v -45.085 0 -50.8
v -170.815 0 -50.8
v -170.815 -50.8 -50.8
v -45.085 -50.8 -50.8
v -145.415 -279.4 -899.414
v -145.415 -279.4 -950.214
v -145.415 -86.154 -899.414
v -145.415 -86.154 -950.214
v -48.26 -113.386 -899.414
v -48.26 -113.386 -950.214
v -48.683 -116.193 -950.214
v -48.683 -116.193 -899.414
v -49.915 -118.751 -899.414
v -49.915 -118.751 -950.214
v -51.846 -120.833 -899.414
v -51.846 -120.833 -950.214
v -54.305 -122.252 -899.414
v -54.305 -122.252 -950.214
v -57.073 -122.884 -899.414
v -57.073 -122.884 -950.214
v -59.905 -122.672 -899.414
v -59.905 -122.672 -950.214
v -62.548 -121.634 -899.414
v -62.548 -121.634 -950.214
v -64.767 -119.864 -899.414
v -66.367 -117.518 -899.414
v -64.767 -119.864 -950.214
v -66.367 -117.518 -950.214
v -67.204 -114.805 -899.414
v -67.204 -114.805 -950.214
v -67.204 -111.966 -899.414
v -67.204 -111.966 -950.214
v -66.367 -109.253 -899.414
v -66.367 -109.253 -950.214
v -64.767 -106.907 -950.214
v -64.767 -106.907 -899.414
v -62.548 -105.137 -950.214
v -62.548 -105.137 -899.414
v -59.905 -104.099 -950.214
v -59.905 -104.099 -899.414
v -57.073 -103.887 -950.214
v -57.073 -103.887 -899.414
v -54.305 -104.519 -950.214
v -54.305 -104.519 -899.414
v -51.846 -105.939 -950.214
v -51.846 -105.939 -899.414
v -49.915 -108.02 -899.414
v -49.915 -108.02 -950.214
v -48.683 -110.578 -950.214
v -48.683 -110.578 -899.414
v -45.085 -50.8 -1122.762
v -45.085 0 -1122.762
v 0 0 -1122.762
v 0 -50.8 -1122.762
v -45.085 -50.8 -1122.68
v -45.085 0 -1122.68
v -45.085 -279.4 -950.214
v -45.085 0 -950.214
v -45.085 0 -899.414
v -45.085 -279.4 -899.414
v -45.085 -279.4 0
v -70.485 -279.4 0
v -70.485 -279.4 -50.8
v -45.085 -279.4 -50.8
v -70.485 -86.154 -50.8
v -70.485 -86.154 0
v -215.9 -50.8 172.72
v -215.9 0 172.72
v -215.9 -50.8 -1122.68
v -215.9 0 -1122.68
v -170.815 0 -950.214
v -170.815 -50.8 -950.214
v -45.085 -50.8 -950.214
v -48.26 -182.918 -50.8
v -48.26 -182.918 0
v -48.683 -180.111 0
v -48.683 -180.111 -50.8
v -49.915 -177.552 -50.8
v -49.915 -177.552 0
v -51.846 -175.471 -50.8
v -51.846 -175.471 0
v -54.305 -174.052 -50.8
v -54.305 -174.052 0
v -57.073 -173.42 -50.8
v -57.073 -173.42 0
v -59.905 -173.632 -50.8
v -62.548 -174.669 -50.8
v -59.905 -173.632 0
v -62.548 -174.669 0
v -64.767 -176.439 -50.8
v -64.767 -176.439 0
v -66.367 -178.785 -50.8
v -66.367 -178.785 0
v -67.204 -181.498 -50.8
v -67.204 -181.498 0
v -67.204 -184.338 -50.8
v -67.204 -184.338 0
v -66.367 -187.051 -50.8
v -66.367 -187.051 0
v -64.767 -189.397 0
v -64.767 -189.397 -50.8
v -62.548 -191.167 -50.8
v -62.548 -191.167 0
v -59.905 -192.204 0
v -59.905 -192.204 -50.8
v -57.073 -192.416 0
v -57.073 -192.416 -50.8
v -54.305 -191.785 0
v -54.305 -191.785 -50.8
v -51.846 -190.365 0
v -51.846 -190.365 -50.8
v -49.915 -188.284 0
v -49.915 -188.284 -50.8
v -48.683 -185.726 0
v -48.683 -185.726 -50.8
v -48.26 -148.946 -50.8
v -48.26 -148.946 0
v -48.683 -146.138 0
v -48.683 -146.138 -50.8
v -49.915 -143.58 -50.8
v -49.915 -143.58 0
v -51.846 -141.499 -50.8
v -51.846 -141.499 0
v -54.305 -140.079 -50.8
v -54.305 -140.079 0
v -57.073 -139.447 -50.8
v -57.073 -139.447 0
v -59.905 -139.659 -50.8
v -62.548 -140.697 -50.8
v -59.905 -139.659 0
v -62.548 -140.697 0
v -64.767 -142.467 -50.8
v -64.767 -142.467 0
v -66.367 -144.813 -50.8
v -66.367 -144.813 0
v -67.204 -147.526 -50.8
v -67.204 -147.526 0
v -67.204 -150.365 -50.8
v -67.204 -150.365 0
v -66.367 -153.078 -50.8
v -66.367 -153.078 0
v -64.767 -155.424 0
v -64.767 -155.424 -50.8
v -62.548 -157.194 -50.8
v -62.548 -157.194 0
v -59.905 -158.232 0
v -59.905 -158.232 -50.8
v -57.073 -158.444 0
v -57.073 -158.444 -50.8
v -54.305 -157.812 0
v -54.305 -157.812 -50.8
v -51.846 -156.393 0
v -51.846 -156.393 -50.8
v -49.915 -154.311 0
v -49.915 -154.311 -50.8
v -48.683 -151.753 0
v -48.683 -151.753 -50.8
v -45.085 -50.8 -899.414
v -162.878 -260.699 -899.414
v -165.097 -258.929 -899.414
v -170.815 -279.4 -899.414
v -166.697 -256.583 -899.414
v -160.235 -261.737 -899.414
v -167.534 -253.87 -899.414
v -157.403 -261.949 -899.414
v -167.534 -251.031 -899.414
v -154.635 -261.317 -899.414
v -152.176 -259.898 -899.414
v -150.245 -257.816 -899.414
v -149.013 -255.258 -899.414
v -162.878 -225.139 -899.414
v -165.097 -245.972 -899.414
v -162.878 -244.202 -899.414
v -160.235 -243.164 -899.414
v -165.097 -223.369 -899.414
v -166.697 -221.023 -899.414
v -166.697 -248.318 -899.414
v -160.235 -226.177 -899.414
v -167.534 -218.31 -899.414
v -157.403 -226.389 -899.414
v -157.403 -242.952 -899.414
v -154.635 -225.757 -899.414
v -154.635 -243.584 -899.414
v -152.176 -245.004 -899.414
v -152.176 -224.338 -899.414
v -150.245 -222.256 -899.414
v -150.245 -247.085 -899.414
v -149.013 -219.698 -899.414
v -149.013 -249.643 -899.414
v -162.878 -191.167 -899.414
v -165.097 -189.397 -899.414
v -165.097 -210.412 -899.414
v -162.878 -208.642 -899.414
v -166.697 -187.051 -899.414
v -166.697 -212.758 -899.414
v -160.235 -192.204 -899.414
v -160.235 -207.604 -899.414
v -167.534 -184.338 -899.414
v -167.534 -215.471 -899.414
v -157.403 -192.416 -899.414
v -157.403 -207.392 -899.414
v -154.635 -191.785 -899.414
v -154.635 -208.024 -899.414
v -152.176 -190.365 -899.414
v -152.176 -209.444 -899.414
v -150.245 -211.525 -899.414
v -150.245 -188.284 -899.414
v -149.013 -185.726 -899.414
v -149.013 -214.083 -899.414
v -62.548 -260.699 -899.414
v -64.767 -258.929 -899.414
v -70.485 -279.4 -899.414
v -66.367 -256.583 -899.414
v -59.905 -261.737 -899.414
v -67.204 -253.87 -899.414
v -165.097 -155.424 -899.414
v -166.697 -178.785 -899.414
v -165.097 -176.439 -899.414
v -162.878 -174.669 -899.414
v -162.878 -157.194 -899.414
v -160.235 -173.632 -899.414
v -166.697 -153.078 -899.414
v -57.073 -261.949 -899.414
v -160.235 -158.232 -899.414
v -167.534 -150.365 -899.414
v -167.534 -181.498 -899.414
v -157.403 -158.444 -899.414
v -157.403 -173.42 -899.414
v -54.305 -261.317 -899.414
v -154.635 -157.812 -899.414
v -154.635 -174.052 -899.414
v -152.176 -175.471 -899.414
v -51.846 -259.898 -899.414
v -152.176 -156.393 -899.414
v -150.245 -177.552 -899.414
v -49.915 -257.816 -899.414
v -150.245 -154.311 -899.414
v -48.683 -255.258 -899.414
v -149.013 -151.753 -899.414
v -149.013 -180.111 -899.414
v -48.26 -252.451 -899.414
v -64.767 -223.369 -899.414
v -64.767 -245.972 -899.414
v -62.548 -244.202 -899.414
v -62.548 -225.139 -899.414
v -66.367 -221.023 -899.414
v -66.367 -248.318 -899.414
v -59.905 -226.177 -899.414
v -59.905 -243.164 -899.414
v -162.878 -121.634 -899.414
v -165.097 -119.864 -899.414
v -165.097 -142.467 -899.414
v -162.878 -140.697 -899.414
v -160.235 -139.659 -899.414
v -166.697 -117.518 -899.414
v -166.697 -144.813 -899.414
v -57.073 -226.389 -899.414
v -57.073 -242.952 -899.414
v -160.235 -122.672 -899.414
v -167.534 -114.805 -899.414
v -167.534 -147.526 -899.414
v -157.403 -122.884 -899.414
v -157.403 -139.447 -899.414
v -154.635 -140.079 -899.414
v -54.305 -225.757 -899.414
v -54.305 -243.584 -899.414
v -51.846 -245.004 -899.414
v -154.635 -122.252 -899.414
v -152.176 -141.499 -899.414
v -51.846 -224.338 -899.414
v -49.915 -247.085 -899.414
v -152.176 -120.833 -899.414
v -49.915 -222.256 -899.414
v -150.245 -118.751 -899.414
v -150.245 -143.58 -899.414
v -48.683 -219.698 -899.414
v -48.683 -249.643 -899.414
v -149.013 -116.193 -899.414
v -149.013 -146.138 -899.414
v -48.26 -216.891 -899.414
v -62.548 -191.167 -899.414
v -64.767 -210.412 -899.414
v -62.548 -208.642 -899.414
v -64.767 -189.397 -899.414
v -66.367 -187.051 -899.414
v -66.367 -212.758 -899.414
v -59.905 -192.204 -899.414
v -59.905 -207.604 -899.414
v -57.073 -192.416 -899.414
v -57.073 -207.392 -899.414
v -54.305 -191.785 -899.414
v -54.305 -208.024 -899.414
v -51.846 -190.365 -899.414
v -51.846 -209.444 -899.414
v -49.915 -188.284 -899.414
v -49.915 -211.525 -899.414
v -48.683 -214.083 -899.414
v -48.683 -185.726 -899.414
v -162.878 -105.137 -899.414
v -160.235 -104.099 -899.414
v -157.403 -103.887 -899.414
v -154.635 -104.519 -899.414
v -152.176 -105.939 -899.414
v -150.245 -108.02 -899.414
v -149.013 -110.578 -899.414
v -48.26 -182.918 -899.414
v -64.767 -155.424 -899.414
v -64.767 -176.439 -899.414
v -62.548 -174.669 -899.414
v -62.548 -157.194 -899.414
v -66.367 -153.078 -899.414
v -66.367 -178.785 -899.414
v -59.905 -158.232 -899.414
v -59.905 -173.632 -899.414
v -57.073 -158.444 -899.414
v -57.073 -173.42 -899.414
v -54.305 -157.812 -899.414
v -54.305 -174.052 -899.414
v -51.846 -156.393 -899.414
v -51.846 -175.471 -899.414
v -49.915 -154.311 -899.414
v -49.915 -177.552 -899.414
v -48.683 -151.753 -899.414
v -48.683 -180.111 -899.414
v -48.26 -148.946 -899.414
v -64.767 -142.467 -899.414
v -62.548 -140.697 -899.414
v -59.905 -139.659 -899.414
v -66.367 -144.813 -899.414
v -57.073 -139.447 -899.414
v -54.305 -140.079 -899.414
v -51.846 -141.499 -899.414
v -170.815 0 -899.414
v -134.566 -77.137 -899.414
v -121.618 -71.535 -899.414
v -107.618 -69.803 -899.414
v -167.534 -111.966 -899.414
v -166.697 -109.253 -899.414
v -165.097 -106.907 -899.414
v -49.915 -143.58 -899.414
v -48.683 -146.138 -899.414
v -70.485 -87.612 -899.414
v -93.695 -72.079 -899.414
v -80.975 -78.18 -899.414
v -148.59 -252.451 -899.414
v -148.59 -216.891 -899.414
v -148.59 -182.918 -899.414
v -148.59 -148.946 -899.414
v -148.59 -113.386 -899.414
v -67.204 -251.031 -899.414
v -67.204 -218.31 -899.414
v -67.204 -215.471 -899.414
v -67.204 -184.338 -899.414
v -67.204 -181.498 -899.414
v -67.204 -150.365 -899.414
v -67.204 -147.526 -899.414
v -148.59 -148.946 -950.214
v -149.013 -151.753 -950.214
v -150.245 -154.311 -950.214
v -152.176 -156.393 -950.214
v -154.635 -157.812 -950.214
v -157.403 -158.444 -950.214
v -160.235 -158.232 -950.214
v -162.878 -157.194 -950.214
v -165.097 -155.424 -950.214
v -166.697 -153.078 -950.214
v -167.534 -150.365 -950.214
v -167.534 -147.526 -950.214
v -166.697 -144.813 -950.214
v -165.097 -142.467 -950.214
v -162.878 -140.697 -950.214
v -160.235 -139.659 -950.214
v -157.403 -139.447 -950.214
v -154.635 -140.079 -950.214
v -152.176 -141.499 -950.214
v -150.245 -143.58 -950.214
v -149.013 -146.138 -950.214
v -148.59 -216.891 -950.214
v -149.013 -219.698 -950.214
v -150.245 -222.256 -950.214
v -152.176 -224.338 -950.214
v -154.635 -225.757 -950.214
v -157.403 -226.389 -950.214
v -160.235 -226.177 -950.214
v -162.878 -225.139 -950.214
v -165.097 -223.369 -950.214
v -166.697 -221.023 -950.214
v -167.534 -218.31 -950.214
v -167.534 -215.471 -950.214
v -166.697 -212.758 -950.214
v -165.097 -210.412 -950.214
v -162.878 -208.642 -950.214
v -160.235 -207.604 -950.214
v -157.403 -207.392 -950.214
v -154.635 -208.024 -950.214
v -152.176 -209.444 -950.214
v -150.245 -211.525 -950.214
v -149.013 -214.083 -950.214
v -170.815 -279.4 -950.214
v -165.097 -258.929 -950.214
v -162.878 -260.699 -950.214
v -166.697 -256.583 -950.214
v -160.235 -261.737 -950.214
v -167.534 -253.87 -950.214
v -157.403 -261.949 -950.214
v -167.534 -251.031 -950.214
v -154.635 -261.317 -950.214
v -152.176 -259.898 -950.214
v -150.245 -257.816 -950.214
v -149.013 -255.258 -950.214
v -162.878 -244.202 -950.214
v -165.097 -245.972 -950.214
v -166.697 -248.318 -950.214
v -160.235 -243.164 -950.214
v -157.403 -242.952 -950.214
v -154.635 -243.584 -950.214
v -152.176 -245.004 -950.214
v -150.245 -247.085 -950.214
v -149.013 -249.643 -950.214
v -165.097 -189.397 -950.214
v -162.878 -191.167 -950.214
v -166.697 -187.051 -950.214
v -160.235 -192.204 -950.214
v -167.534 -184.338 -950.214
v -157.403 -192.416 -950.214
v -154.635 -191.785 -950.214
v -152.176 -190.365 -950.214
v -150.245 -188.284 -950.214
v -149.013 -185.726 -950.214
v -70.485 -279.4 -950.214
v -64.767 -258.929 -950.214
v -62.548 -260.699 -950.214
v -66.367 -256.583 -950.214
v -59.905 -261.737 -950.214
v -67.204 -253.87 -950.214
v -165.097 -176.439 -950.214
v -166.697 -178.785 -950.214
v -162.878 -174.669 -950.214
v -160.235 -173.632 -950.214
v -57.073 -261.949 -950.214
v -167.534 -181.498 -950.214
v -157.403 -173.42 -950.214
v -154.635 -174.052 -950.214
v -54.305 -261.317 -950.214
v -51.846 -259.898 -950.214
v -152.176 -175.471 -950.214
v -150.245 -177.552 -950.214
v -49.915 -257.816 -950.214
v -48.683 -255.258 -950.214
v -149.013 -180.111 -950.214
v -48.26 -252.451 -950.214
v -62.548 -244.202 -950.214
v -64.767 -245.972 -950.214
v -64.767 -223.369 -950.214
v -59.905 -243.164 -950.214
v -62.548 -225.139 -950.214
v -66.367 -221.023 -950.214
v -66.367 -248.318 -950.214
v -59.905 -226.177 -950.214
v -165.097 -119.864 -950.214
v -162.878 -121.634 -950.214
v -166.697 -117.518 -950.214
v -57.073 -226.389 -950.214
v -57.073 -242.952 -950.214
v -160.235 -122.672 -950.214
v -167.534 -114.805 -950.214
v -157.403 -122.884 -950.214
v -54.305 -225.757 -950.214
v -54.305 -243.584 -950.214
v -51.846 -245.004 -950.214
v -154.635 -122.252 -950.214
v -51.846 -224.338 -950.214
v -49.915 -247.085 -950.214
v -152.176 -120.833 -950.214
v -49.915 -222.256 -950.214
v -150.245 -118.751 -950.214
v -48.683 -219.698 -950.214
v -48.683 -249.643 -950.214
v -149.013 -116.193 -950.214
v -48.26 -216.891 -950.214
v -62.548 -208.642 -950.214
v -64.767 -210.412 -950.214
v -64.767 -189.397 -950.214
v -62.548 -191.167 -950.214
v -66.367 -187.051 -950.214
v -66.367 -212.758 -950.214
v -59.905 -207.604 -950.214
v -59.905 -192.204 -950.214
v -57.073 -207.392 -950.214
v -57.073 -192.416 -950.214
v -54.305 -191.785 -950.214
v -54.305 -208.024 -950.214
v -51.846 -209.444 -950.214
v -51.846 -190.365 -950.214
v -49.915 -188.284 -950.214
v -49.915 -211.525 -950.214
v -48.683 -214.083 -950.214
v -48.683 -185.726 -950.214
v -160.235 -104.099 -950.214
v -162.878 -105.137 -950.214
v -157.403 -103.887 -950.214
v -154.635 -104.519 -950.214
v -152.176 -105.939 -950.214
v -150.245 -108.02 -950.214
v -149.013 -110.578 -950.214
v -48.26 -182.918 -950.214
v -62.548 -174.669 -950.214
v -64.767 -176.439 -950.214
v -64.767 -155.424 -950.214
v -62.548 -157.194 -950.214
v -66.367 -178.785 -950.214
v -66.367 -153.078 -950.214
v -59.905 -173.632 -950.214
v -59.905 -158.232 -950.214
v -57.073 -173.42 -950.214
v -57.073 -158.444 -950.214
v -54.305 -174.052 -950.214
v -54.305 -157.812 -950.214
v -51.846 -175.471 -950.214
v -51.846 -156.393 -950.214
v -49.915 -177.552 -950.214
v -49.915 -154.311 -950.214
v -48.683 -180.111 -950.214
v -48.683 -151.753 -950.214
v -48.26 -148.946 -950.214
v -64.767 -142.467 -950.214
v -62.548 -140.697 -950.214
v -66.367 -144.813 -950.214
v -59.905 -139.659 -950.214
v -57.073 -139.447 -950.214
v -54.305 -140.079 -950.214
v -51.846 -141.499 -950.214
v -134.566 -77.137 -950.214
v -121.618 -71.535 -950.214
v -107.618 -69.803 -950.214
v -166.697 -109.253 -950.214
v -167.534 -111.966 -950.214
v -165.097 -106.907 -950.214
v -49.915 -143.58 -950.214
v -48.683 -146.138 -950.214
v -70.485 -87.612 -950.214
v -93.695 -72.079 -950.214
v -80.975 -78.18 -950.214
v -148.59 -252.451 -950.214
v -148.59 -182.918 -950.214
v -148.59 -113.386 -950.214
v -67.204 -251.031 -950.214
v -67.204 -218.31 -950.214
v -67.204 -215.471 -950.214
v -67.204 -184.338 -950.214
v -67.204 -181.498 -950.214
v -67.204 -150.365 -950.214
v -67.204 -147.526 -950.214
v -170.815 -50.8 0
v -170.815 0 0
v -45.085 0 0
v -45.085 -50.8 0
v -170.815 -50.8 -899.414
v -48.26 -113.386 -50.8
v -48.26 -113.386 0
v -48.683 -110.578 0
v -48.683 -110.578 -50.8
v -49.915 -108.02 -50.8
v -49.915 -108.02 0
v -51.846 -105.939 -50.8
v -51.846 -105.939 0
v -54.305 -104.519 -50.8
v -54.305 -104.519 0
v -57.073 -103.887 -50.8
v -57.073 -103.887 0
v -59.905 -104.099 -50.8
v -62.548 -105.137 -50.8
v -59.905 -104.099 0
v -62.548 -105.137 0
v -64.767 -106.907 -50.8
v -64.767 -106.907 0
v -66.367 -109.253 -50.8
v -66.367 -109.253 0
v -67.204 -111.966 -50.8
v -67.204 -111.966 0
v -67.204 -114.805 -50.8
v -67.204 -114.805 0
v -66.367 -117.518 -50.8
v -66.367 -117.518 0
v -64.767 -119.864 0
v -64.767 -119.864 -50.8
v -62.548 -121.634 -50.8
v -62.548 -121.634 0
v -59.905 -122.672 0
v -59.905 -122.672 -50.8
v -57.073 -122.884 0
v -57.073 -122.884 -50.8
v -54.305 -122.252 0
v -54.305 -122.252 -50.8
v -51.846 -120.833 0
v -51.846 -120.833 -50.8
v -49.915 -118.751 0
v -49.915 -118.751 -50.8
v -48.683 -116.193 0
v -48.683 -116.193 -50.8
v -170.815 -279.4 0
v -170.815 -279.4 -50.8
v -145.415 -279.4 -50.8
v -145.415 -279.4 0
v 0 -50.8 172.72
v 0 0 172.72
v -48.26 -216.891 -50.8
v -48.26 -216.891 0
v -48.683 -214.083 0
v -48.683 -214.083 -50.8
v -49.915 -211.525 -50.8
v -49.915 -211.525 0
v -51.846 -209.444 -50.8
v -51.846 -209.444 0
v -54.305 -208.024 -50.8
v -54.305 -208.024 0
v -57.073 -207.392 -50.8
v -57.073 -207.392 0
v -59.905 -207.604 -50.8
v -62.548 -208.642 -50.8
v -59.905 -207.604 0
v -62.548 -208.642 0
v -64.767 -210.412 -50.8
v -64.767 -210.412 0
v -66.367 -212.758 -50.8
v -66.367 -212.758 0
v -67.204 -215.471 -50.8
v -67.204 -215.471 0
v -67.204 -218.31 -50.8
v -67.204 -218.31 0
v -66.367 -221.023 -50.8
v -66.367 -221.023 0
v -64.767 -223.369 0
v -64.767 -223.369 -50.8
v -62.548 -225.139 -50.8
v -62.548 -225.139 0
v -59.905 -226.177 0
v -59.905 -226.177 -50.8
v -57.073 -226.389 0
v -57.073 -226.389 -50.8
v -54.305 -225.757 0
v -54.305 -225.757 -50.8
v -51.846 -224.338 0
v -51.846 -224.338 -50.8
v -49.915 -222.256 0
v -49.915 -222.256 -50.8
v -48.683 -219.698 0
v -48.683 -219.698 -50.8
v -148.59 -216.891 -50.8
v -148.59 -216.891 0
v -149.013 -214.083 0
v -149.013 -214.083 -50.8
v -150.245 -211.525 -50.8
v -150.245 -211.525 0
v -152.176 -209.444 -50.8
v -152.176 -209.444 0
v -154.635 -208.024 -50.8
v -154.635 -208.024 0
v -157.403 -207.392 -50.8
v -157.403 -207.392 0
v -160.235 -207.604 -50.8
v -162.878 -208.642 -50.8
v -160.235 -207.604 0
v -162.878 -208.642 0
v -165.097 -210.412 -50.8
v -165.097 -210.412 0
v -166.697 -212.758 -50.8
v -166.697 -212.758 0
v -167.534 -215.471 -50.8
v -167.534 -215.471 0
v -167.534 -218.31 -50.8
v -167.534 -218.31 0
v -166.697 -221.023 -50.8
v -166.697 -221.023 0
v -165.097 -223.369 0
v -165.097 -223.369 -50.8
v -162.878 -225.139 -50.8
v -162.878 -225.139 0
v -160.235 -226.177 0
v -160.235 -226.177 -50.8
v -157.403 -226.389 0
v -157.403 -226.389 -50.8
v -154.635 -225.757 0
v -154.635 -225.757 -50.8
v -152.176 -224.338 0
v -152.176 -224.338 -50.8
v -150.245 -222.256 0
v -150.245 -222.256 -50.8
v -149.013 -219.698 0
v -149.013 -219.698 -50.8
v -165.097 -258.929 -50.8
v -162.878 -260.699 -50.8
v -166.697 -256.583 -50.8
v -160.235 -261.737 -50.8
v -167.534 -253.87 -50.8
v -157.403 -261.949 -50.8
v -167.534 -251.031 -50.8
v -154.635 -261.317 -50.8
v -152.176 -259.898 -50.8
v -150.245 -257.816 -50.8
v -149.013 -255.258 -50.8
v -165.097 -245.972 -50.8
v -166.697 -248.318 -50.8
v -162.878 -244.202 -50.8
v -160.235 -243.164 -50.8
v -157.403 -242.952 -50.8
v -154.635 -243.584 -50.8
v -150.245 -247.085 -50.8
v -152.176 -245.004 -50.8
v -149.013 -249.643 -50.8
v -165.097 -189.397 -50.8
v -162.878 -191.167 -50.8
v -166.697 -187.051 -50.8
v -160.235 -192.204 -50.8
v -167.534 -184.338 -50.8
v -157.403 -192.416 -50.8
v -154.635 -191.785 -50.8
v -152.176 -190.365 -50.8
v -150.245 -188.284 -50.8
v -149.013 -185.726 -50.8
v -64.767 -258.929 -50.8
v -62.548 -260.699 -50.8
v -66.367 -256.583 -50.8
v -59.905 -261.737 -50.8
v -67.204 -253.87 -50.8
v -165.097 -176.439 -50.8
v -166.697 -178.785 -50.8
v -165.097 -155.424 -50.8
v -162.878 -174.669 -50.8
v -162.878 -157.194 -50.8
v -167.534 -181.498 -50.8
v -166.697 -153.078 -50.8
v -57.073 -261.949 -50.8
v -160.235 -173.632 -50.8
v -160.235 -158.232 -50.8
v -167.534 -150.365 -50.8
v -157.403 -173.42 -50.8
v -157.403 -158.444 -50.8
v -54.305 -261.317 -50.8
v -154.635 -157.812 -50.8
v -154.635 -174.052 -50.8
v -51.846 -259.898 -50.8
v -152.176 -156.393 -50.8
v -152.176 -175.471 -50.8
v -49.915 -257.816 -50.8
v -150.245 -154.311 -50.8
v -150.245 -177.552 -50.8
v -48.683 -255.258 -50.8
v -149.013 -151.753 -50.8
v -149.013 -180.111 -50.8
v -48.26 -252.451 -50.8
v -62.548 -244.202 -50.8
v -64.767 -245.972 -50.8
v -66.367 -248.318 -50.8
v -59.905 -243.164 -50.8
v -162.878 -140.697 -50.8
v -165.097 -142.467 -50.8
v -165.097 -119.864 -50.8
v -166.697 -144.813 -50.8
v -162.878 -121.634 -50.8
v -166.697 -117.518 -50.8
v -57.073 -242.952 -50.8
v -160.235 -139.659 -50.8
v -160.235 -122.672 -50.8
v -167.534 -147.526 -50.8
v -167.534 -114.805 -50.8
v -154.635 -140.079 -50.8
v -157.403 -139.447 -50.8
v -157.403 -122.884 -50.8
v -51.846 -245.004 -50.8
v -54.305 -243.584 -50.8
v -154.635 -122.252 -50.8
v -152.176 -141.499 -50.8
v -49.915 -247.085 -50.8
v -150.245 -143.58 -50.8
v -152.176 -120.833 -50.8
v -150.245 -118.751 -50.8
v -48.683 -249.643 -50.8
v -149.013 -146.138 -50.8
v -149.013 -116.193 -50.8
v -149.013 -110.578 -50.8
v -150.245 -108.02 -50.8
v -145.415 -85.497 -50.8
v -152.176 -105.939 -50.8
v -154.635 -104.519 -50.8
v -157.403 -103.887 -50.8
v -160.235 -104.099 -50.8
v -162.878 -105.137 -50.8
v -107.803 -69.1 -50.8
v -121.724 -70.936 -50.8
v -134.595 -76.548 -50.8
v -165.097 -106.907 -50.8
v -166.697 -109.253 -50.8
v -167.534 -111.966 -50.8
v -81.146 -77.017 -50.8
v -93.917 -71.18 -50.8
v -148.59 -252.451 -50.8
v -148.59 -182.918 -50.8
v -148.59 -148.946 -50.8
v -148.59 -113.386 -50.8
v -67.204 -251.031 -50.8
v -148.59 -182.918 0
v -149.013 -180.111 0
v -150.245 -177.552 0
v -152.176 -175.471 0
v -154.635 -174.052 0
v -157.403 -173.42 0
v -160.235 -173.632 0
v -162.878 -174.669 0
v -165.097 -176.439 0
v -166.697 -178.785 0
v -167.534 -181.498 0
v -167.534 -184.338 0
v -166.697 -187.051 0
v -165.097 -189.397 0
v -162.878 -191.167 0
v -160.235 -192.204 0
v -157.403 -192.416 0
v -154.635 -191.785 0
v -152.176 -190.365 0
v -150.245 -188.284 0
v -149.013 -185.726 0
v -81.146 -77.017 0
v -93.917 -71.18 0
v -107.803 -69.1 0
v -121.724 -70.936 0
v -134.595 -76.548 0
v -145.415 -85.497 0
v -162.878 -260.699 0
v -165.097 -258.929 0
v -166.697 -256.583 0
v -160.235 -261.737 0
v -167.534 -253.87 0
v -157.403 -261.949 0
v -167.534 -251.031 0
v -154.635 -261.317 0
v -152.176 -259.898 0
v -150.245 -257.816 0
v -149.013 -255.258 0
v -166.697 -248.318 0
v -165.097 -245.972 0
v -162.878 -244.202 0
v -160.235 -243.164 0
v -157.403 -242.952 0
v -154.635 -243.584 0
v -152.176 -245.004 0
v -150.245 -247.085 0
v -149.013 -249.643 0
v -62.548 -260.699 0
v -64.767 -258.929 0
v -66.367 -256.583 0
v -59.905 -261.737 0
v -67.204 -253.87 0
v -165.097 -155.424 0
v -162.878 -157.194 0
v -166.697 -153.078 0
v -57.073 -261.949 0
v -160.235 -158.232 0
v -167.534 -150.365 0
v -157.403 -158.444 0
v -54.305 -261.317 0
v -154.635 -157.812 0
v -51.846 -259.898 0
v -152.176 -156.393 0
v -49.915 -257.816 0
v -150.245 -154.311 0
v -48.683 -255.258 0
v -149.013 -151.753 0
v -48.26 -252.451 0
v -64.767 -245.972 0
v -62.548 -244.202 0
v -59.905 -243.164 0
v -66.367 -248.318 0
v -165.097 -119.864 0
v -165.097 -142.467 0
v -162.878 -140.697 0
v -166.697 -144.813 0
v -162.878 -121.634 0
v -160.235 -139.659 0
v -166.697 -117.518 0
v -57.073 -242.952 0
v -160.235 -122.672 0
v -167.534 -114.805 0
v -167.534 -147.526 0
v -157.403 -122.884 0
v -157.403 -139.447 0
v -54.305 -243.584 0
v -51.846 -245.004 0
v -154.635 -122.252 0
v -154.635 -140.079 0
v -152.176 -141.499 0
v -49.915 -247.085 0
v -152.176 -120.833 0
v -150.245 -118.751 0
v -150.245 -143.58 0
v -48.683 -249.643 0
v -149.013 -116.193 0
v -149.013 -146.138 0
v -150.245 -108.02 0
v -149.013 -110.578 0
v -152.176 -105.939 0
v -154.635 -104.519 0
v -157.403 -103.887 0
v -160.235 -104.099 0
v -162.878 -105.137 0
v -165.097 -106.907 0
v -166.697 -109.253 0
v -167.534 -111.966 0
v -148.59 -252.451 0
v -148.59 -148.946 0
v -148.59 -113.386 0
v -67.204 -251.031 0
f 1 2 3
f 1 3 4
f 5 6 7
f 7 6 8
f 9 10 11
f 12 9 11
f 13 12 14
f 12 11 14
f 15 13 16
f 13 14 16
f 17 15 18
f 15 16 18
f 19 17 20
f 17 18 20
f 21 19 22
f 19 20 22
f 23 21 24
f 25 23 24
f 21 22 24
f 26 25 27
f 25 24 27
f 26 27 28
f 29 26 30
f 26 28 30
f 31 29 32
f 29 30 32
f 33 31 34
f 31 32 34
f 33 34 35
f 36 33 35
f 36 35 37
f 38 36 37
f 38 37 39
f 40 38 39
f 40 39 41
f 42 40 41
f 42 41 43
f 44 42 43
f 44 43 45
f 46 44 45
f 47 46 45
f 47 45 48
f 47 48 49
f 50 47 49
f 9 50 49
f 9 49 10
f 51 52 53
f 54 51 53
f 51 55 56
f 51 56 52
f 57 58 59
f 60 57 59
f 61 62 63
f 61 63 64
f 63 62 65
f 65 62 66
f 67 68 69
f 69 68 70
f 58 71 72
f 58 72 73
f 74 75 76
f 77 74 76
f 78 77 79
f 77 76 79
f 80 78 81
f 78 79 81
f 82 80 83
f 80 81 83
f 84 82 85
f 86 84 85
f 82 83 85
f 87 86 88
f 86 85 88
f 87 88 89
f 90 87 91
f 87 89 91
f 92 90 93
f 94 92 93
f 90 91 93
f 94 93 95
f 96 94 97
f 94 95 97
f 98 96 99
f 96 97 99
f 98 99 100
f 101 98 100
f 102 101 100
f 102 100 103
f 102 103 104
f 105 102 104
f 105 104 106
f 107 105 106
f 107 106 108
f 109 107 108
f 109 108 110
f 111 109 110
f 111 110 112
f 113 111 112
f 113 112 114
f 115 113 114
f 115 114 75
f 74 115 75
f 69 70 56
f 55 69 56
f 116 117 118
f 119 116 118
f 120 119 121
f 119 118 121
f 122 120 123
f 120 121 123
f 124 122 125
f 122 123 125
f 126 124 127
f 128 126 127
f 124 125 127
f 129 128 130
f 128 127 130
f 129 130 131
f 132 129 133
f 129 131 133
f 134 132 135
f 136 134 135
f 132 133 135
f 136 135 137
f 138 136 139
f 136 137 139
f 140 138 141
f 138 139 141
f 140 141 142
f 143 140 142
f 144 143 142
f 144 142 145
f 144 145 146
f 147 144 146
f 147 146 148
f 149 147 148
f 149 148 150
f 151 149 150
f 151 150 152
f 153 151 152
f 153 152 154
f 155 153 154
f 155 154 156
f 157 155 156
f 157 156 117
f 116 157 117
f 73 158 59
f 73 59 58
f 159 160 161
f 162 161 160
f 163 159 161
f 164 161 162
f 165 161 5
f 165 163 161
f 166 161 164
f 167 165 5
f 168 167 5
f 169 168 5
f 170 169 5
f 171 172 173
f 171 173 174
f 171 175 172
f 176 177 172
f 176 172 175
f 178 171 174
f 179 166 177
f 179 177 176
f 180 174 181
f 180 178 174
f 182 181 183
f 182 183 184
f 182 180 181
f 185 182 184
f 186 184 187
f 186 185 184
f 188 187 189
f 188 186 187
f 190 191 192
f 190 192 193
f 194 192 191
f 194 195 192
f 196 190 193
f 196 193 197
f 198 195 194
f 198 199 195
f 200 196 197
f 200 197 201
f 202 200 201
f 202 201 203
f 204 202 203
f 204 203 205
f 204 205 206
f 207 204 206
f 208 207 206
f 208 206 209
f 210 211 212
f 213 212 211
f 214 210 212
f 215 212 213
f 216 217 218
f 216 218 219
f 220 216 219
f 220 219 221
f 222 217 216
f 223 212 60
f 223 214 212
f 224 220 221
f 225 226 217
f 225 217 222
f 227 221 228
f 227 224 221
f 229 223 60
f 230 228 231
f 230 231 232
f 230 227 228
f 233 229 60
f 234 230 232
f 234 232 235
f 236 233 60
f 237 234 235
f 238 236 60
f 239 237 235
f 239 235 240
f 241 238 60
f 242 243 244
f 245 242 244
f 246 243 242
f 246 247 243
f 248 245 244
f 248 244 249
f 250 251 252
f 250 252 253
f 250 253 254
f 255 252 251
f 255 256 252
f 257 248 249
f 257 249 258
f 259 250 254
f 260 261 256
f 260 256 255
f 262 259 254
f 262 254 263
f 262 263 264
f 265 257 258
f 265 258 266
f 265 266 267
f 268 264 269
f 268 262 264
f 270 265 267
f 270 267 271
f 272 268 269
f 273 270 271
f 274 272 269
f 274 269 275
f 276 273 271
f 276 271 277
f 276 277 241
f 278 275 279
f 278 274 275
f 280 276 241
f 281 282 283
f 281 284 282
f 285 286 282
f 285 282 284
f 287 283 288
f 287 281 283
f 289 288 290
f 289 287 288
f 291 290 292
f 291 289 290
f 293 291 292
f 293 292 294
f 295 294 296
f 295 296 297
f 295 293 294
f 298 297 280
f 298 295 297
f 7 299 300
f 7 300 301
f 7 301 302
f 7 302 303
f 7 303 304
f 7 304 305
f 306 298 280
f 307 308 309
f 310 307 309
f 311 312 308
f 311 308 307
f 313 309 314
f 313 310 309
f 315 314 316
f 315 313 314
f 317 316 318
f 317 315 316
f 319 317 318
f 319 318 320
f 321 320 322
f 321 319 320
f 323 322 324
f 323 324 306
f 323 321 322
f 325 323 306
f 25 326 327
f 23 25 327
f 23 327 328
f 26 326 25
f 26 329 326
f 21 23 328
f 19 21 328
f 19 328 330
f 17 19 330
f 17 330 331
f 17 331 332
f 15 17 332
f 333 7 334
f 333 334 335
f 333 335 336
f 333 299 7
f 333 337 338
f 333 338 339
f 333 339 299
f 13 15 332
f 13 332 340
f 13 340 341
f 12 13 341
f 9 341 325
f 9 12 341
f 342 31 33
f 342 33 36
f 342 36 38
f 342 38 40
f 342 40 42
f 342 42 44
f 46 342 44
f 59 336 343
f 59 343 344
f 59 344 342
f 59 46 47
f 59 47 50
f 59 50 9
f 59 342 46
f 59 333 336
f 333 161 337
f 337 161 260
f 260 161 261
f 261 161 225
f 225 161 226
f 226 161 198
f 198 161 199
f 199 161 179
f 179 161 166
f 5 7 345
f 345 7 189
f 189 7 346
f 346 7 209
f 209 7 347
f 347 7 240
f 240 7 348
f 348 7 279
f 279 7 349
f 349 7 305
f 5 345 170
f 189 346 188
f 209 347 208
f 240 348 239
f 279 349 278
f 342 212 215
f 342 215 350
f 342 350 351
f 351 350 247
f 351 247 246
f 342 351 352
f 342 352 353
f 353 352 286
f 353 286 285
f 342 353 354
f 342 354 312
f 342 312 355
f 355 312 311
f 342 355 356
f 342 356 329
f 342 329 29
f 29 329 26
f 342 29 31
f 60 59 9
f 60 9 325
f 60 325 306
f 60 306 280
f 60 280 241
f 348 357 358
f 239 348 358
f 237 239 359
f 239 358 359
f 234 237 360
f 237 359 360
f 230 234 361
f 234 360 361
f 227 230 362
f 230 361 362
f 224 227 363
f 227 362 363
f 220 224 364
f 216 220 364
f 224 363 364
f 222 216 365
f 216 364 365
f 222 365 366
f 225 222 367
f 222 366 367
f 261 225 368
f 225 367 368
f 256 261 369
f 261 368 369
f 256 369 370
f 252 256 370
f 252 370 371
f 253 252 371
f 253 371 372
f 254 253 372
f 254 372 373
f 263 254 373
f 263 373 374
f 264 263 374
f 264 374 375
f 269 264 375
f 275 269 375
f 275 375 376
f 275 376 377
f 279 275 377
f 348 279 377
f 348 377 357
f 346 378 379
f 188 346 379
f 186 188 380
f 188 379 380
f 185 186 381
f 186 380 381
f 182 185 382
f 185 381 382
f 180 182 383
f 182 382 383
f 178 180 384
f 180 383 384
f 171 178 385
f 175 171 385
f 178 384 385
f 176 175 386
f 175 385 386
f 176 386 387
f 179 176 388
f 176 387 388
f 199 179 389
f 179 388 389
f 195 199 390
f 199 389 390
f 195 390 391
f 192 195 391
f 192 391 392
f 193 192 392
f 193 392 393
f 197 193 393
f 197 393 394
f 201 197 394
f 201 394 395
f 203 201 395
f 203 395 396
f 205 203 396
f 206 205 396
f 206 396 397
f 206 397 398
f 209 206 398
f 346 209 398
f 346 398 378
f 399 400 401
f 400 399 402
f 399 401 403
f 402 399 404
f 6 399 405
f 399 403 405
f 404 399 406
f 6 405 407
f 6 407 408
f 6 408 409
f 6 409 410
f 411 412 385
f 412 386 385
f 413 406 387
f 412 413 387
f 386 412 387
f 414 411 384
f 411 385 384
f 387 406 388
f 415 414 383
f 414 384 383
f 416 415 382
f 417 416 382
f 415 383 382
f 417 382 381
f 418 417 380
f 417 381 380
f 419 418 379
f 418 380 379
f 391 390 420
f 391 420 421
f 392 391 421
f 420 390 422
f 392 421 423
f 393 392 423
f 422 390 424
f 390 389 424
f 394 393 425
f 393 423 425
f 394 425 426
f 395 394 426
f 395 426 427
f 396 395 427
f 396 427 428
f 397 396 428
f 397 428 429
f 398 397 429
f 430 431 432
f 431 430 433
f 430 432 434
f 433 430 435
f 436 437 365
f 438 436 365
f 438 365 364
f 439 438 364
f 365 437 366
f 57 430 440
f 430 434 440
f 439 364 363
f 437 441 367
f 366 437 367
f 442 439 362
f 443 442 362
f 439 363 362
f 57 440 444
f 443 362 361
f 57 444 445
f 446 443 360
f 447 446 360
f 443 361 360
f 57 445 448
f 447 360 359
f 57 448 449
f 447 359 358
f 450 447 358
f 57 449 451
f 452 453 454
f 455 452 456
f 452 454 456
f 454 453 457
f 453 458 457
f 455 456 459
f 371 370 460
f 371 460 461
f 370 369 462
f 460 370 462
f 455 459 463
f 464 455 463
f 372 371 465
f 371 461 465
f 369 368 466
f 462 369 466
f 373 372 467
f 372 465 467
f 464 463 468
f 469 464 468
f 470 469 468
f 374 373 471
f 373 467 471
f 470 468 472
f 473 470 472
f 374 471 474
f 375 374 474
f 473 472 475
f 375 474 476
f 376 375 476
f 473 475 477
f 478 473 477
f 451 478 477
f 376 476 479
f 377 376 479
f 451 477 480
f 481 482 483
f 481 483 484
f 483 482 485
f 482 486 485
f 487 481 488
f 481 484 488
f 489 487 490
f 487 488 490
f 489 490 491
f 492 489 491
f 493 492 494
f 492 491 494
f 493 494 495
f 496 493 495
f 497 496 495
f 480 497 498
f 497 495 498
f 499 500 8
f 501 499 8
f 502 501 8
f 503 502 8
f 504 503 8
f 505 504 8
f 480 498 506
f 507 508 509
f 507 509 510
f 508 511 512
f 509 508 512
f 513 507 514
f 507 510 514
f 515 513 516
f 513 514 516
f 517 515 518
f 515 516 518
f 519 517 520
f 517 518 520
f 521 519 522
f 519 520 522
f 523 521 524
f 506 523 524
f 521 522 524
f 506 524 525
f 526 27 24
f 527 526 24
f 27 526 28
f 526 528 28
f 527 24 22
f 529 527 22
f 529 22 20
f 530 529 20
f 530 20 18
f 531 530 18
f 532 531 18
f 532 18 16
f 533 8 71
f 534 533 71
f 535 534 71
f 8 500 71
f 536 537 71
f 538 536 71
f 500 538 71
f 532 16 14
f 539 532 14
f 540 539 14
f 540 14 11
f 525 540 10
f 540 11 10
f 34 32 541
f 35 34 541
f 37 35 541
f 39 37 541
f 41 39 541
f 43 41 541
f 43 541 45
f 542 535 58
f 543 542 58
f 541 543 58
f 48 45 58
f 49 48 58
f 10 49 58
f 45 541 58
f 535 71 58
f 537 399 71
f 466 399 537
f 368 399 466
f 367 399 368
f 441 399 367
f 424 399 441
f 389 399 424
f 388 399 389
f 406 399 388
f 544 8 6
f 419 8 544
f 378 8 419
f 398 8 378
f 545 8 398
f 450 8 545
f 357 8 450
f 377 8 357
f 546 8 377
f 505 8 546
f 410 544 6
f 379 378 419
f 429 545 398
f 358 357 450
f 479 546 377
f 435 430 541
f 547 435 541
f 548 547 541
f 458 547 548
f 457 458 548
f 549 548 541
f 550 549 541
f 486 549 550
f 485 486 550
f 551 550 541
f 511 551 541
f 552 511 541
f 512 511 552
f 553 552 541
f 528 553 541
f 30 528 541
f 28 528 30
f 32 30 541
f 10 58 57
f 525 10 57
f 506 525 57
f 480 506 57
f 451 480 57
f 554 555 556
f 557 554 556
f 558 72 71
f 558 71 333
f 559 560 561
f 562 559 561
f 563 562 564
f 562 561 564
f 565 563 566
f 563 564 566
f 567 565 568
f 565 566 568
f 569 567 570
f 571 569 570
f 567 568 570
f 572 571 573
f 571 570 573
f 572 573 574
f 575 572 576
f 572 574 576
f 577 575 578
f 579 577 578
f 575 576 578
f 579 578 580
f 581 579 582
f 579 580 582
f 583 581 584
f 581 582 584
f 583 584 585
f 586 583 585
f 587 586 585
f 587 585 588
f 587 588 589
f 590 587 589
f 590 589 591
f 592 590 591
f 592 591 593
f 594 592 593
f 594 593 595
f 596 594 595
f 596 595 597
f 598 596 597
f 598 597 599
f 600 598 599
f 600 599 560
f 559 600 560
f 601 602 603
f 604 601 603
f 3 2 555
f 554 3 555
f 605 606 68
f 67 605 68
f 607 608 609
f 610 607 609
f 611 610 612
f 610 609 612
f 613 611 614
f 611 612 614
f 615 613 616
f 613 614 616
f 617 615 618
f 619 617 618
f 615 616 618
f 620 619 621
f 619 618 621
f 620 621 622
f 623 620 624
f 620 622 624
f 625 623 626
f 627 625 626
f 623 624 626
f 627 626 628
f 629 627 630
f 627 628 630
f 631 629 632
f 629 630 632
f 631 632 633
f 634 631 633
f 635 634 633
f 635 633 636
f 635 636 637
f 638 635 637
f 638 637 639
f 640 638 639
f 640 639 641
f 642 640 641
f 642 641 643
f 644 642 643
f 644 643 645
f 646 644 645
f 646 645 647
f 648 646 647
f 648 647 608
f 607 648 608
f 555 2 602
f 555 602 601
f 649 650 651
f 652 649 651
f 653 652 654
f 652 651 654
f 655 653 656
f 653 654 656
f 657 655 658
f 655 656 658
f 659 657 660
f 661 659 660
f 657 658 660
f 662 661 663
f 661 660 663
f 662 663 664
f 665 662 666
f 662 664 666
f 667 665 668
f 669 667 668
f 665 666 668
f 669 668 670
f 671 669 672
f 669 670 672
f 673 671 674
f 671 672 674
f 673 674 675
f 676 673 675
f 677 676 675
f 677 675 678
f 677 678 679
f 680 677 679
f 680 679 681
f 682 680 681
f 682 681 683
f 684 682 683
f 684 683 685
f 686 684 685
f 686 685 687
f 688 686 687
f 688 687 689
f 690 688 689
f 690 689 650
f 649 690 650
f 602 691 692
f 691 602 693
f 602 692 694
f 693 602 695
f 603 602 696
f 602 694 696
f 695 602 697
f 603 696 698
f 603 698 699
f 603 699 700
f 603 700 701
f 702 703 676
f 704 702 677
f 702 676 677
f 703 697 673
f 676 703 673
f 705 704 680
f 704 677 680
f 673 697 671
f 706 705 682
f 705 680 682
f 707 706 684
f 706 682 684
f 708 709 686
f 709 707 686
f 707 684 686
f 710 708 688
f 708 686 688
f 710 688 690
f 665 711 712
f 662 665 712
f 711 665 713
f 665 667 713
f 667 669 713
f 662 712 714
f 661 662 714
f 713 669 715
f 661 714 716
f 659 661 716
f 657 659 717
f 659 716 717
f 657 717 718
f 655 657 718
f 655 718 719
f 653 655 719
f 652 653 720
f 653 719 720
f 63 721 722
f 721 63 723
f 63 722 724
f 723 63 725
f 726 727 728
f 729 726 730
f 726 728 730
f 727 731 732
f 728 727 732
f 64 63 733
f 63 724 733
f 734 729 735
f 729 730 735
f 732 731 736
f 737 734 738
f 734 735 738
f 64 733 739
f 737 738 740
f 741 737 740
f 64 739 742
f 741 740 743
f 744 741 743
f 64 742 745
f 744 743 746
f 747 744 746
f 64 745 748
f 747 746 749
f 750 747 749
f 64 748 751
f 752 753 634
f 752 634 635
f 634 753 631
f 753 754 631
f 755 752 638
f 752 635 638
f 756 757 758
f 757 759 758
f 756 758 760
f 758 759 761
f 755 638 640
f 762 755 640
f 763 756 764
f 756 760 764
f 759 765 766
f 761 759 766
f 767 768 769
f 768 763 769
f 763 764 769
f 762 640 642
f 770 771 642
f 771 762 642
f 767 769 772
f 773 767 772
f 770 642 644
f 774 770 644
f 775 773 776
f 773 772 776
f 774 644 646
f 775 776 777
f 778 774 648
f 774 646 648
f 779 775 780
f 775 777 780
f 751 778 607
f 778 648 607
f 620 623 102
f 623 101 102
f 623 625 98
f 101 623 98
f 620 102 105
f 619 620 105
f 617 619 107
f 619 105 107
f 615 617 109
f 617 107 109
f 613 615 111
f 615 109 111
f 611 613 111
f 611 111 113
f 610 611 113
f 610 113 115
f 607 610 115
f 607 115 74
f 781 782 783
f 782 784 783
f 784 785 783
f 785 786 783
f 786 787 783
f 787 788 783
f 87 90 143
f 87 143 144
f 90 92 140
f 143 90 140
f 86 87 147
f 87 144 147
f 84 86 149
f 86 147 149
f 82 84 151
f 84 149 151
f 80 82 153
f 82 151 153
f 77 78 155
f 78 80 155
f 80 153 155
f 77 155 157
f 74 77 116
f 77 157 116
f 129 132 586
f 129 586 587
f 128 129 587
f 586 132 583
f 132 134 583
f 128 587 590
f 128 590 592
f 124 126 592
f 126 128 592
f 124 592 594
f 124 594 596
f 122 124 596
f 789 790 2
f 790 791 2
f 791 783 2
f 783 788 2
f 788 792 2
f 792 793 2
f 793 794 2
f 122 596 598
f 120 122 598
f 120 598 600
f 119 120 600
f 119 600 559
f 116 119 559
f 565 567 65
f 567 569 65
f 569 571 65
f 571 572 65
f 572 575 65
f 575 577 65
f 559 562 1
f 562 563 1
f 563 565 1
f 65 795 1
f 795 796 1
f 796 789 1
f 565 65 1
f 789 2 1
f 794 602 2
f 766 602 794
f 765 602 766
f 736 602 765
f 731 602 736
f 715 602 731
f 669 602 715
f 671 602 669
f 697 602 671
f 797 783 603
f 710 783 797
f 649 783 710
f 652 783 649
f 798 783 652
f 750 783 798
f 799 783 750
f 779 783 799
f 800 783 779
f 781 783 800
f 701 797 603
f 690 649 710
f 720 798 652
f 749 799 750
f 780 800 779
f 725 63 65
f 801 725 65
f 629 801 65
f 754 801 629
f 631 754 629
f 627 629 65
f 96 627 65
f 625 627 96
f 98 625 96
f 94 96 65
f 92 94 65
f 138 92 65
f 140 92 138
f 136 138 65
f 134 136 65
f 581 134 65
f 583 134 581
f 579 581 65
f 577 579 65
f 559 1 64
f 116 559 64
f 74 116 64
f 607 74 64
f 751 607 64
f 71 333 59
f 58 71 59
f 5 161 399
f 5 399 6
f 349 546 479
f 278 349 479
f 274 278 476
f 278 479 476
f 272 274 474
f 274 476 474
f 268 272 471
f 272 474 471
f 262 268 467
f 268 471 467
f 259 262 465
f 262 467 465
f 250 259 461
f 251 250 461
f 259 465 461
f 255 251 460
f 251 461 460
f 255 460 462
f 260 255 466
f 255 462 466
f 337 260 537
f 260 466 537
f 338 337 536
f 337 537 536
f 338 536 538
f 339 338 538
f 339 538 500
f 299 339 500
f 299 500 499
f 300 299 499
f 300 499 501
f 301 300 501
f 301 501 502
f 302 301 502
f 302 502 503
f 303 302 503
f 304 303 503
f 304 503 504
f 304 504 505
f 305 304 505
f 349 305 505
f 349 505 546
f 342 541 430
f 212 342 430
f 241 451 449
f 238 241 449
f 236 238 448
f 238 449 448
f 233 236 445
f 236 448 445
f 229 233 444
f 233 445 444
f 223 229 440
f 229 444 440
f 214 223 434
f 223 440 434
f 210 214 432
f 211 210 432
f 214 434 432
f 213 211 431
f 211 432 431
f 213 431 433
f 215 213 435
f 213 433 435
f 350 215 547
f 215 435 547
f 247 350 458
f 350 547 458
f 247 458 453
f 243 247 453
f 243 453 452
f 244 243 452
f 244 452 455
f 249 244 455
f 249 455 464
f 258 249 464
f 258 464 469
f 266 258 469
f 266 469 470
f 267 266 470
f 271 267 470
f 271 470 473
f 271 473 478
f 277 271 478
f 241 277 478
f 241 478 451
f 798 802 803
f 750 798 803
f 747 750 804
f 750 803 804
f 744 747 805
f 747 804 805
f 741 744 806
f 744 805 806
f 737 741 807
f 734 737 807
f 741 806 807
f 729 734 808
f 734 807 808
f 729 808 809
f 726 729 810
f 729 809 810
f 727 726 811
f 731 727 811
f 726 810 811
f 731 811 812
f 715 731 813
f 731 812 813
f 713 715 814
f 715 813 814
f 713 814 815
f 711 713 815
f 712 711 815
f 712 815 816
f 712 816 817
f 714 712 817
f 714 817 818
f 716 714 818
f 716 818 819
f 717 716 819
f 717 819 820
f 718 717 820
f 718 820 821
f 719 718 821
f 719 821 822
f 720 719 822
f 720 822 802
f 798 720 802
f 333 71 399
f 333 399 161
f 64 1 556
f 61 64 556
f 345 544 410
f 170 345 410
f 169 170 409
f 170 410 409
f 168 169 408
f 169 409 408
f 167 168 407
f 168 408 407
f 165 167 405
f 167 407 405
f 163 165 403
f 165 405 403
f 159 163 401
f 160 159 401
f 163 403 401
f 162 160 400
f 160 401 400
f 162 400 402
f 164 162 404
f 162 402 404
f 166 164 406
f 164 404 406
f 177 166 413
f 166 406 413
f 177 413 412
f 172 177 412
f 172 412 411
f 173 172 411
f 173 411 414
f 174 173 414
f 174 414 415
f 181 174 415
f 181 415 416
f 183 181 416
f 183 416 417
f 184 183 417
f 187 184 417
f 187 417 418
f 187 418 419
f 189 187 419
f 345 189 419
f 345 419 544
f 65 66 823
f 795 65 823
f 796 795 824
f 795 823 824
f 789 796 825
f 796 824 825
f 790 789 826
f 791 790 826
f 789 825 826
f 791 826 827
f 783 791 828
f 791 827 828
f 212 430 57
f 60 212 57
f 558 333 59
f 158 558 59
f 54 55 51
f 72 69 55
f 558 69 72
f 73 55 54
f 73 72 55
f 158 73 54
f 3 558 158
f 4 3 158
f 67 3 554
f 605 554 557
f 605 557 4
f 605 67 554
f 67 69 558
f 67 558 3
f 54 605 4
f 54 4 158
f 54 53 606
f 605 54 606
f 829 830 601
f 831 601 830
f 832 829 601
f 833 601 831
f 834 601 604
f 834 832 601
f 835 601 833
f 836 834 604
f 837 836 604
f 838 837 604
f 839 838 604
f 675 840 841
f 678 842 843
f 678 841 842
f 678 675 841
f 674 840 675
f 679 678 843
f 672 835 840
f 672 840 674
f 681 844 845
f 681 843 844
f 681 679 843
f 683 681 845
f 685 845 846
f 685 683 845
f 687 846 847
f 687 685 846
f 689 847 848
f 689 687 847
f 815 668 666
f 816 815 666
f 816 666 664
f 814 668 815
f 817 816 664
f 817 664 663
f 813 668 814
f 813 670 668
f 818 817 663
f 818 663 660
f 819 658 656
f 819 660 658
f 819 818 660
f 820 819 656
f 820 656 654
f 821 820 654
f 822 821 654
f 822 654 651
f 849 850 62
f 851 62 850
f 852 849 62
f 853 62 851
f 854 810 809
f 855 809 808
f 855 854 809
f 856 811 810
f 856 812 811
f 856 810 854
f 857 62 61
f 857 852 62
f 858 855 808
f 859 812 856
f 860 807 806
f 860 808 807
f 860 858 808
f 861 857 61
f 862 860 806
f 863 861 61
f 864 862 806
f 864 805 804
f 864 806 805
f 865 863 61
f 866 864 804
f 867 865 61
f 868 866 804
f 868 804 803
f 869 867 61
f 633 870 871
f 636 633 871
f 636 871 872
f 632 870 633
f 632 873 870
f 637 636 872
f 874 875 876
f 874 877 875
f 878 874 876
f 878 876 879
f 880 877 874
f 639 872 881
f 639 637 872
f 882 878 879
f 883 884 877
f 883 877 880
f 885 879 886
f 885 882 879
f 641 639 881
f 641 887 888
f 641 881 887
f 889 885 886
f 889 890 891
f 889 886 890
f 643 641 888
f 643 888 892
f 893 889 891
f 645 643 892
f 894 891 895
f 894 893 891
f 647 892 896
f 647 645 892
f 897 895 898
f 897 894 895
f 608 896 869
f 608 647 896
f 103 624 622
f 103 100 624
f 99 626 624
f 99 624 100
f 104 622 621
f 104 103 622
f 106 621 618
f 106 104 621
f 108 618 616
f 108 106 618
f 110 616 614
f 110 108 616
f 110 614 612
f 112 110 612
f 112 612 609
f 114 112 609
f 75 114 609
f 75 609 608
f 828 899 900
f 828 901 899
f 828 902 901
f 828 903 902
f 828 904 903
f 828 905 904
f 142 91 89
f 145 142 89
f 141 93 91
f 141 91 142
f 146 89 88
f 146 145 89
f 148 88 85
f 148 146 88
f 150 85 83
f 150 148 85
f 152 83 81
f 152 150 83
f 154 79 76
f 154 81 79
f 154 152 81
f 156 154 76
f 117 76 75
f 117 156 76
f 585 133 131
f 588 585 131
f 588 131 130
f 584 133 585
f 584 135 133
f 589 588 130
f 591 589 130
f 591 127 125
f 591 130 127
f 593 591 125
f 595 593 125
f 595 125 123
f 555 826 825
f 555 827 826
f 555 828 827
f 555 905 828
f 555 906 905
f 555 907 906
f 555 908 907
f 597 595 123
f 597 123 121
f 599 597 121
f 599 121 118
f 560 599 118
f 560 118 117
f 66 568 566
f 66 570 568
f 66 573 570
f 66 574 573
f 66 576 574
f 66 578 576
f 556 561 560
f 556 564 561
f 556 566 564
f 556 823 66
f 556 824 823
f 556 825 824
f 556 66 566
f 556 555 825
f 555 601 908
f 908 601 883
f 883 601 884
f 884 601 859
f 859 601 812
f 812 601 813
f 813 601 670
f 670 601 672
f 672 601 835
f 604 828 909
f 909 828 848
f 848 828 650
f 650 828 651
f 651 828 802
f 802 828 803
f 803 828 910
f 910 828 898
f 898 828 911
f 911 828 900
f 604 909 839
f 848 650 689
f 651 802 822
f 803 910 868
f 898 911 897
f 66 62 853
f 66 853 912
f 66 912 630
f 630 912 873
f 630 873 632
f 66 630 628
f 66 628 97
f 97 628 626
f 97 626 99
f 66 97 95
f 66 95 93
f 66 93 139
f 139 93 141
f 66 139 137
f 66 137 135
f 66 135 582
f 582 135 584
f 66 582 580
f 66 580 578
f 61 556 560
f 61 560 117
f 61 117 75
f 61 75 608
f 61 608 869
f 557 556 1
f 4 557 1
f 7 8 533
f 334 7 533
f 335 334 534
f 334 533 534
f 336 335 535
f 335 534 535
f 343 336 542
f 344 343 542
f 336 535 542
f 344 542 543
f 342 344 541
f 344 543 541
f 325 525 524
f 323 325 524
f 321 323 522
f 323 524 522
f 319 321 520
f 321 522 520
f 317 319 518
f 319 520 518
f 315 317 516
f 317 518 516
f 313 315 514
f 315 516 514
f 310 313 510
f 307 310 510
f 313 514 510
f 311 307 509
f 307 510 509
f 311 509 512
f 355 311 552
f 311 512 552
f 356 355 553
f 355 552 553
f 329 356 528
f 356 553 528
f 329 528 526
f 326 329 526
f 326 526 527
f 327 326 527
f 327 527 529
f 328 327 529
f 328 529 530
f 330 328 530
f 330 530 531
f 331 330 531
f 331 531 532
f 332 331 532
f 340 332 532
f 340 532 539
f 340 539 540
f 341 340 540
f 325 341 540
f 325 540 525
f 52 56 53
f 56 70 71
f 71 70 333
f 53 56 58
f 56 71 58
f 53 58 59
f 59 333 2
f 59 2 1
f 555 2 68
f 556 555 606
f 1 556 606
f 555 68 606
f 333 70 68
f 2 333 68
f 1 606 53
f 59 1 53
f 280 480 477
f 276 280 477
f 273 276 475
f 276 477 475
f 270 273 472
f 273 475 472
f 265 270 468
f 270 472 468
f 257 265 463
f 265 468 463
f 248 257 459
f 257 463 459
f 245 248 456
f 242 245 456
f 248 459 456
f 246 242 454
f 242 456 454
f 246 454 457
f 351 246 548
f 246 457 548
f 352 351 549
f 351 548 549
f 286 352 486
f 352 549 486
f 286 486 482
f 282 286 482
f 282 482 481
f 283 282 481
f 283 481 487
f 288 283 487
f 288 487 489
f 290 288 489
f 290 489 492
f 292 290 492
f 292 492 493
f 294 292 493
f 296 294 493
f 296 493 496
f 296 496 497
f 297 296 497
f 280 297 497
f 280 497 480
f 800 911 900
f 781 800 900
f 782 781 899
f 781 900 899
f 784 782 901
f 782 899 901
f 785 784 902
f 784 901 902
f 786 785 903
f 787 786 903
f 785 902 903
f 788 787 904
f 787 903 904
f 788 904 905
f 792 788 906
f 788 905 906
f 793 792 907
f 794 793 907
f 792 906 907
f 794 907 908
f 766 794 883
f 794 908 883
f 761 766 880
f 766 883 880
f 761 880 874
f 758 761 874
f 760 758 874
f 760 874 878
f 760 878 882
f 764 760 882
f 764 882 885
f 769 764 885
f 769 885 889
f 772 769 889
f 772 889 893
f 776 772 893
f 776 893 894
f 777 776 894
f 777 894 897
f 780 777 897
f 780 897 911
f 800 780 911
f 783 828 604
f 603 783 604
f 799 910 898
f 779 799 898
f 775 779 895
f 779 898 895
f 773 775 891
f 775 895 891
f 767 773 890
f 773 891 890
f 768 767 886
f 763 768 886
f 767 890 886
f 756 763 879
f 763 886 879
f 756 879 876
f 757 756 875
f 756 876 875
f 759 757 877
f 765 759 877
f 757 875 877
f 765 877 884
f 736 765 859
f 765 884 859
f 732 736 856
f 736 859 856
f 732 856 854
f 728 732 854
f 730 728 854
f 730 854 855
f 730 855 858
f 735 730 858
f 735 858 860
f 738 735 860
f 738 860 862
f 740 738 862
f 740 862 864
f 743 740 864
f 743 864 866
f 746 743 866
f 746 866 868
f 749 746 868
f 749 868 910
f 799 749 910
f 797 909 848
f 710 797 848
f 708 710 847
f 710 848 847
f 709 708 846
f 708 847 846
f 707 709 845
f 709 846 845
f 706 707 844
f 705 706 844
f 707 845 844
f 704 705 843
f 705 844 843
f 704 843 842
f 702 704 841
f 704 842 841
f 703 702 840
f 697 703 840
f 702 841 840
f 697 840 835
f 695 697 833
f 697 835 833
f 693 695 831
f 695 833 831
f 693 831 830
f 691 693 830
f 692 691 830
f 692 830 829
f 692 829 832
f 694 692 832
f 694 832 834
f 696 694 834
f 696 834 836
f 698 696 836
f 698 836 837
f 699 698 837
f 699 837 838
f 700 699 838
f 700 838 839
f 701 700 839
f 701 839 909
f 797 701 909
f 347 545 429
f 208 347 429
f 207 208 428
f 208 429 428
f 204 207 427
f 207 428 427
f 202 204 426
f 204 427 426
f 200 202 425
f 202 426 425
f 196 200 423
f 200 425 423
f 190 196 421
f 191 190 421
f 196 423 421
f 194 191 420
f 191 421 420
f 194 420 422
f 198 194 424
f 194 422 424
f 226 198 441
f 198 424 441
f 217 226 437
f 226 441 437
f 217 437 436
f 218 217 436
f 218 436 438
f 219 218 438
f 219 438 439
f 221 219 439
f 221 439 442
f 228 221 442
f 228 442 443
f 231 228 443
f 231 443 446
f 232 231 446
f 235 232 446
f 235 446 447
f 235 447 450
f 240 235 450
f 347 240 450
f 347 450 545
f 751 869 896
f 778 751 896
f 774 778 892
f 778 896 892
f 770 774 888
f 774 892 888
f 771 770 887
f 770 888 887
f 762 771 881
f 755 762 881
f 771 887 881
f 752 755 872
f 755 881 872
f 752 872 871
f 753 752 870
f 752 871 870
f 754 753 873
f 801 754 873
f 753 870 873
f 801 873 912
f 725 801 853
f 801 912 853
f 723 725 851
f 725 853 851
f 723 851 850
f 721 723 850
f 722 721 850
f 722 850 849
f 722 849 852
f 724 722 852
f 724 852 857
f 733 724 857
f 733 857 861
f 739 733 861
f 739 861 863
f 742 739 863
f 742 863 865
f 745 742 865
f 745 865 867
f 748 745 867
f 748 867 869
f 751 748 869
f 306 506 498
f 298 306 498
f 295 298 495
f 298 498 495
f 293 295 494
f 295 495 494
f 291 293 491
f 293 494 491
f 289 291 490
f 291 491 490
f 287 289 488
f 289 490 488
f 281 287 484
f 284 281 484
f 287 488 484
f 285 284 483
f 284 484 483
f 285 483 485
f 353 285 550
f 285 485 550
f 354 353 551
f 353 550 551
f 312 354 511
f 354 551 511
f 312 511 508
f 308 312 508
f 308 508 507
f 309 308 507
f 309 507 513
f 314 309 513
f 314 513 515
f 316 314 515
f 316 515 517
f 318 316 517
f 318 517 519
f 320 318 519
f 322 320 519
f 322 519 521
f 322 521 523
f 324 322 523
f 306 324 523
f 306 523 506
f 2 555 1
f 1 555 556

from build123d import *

# Parameters (mm, degrees)
F0_W      = 125.73
F0_H      = 172.72
F0_H_2    = 848.614
F0_H_3    = 172.466
F1_DEPTH  = 50.8
F0_H_4    = 50.8
F2_DEPTH  = 279.4
F3_W      = 74.93
F3_H      = 4.6193234962
F4_DEPTH  = 154.94
F5_W      = 74.93
F5_H      = 11.4905911902
F6_DEPTH  = 111.76
F7_R      = 9.525
F9_DEPTH  = 53.34
F10_R     = 9.525
F11_DEPTH = 53.34
F12_R     = 9.525
F13_DEPTH = 53.34


# Not quite as in the source:
# - a feature names something its author has since deleted; it is built from what else it names


with BuildPart() as f1:
    # F0 (on Front) → F1 (new body)
    with BuildSketch(Plane.XZ):
        with Locations((-107.95, 86.36)):
            Rectangle(F0_W, F0_H)
        with Locations((-107.95, -475.107)):
            Rectangle(F0_W, F0_H_2)
        with Locations((-107.95, -1036.447)):
            Rectangle(F0_W, F0_H_3)
        Polygon((-170.815, 0), (-170.815, 172.72), (-215.9, 172.72), (-215.9, -1122.68), (-170.815, -1122.68), (-170.815, -950.214), (-170.815, -899.414), (-170.815, -50.8), align=None)
        Polygon((0, 172.72), (-45.085, 172.72), (-45.085, 0), (-45.085, -50.8), (-45.085, -899.414), (-45.085, -950.214), (-45.085, -1122.68), (-45.085, -1122.7624416351), (0, -1122.7624416351), align=None)
    extrude(amount=F1_DEPTH)


with BuildPart() as f2:
    # F0 (on Front) → F2 (new body)
    with BuildSketch(Plane.XZ):
        with Locations((-107.95, -25.4)):
            Rectangle(F0_W, F0_H_4)
    extrude(amount=F2_DEPTH)

    # F5 (on face) → F6 (cut)
    with BuildSketch(Plane.XY):
        with Locations((-107.95, -285.1452955951)):
            Rectangle(F5_W, F5_H)
        with BuildLine():
            Line((-145.415, -85.4969564537), (-145.415, -279.4))
            Line((-145.415, -279.4), (-70.485, -279.4))
            Line((-70.485, -279.4), (-70.485, -86.1544632))
            ThreePointArc((-70.485, -86.1544632), (-107.803229226, -69.0995938432), (-145.415, -85.4969564537))
        make_face()
    extrude(amount=-F6_DEPTH, mode=Mode.SUBTRACT)

    # F7 (on face) → F9 (cut)
    with BuildSketch(Plane.XY):
        with Locations((-57.785, -113.3856)):
            Circle(F7_R)
        with Locations((-57.785, -148.9456)):
            Circle(F7_R)
        with Locations((-57.785, -182.9181)):
            Circle(F7_R)
        with Locations((-57.785, -252.4506)):
            Circle(F7_R)
        with Locations((-57.785, -216.8906)):
            Circle(F7_R)
    extrude(amount=-F9_DEPTH, mode=Mode.SUBTRACT)

    # F10 (on face) → F11 (cut)
    with BuildSketch(Plane.XY):
        with Locations((-158.115, -113.3856)):
            Circle(F10_R)
        with Locations((-158.115, -148.9456)):
            Circle(F10_R)
        with Locations((-158.115, -182.9181)):
            Circle(F10_R)
        with Locations((-158.115, -216.8906)):
            Circle(F10_R)
        with Locations((-158.115, -252.4506)):
            Circle(F10_R)
    extrude(amount=-F11_DEPTH, mode=Mode.SUBTRACT)


with BuildPart() as f2b:
    # F0 (on Front) → F2, piece 2 (new body)
    with BuildSketch(Plane.XZ):
        with Locations((-107.95, -924.814)):
            Rectangle(F0_W, F0_H_4)
    extrude(amount=F2_DEPTH)

    # F3 (on face) → F4 (cut)
    with BuildSketch(Plane(origin=(0, 0, -950.214), x_dir=(1, 0, 0), z_dir=(0, 0, -1))):
        with Locations((-107.95, 281.7096617481)):
            Rectangle(F3_W, F3_H)
        with BuildLine():
            Line((-70.485, 87.6124339393), (-70.485, 279.4))
            Line((-70.485, 279.4), (-145.415, 279.4))
            Line((-145.415, 279.4), (-145.415, 86.1544632))
            ThreePointArc((-145.415, 86.1544632), (-107.617645147, 69.8026193953), (-70.485, 87.6124339393))
        make_face()
    extrude(amount=-F4_DEPTH, mode=Mode.SUBTRACT)

    # F12 (on face) → F13 (cut)
    with BuildSketch(Plane(origin=(0, 0, -950.214), x_dir=(1, 0, 0), z_dir=(0, 0, -1))):
        with Locations((-158.115, 113.3856)):
            Circle(F12_R)
        with Locations((-158.115, 148.9456)):
            Circle(F12_R)
        with Locations((-158.115, 182.9181)):
            Circle(F12_R)
        with Locations((-158.115, 216.8906)):
            Circle(F12_R)
        with Locations((-158.115, 252.4506)):
            Circle(F12_R)
        with Locations((-57.785, 113.3856)):
            Circle(F12_R)
        with Locations((-57.785, 148.9456)):
            Circle(F12_R)
        with Locations((-57.785, 182.9181)):
            Circle(F12_R)
        with Locations((-57.785, 216.8906)):
            Circle(F12_R)
        with Locations((-57.785, 252.4506)):
            Circle(F12_R)
    extrude(amount=-F13_DEPTH, mode=Mode.SUBTRACT)


solid = Compound([f1.part, f2.part, f2b.part])
